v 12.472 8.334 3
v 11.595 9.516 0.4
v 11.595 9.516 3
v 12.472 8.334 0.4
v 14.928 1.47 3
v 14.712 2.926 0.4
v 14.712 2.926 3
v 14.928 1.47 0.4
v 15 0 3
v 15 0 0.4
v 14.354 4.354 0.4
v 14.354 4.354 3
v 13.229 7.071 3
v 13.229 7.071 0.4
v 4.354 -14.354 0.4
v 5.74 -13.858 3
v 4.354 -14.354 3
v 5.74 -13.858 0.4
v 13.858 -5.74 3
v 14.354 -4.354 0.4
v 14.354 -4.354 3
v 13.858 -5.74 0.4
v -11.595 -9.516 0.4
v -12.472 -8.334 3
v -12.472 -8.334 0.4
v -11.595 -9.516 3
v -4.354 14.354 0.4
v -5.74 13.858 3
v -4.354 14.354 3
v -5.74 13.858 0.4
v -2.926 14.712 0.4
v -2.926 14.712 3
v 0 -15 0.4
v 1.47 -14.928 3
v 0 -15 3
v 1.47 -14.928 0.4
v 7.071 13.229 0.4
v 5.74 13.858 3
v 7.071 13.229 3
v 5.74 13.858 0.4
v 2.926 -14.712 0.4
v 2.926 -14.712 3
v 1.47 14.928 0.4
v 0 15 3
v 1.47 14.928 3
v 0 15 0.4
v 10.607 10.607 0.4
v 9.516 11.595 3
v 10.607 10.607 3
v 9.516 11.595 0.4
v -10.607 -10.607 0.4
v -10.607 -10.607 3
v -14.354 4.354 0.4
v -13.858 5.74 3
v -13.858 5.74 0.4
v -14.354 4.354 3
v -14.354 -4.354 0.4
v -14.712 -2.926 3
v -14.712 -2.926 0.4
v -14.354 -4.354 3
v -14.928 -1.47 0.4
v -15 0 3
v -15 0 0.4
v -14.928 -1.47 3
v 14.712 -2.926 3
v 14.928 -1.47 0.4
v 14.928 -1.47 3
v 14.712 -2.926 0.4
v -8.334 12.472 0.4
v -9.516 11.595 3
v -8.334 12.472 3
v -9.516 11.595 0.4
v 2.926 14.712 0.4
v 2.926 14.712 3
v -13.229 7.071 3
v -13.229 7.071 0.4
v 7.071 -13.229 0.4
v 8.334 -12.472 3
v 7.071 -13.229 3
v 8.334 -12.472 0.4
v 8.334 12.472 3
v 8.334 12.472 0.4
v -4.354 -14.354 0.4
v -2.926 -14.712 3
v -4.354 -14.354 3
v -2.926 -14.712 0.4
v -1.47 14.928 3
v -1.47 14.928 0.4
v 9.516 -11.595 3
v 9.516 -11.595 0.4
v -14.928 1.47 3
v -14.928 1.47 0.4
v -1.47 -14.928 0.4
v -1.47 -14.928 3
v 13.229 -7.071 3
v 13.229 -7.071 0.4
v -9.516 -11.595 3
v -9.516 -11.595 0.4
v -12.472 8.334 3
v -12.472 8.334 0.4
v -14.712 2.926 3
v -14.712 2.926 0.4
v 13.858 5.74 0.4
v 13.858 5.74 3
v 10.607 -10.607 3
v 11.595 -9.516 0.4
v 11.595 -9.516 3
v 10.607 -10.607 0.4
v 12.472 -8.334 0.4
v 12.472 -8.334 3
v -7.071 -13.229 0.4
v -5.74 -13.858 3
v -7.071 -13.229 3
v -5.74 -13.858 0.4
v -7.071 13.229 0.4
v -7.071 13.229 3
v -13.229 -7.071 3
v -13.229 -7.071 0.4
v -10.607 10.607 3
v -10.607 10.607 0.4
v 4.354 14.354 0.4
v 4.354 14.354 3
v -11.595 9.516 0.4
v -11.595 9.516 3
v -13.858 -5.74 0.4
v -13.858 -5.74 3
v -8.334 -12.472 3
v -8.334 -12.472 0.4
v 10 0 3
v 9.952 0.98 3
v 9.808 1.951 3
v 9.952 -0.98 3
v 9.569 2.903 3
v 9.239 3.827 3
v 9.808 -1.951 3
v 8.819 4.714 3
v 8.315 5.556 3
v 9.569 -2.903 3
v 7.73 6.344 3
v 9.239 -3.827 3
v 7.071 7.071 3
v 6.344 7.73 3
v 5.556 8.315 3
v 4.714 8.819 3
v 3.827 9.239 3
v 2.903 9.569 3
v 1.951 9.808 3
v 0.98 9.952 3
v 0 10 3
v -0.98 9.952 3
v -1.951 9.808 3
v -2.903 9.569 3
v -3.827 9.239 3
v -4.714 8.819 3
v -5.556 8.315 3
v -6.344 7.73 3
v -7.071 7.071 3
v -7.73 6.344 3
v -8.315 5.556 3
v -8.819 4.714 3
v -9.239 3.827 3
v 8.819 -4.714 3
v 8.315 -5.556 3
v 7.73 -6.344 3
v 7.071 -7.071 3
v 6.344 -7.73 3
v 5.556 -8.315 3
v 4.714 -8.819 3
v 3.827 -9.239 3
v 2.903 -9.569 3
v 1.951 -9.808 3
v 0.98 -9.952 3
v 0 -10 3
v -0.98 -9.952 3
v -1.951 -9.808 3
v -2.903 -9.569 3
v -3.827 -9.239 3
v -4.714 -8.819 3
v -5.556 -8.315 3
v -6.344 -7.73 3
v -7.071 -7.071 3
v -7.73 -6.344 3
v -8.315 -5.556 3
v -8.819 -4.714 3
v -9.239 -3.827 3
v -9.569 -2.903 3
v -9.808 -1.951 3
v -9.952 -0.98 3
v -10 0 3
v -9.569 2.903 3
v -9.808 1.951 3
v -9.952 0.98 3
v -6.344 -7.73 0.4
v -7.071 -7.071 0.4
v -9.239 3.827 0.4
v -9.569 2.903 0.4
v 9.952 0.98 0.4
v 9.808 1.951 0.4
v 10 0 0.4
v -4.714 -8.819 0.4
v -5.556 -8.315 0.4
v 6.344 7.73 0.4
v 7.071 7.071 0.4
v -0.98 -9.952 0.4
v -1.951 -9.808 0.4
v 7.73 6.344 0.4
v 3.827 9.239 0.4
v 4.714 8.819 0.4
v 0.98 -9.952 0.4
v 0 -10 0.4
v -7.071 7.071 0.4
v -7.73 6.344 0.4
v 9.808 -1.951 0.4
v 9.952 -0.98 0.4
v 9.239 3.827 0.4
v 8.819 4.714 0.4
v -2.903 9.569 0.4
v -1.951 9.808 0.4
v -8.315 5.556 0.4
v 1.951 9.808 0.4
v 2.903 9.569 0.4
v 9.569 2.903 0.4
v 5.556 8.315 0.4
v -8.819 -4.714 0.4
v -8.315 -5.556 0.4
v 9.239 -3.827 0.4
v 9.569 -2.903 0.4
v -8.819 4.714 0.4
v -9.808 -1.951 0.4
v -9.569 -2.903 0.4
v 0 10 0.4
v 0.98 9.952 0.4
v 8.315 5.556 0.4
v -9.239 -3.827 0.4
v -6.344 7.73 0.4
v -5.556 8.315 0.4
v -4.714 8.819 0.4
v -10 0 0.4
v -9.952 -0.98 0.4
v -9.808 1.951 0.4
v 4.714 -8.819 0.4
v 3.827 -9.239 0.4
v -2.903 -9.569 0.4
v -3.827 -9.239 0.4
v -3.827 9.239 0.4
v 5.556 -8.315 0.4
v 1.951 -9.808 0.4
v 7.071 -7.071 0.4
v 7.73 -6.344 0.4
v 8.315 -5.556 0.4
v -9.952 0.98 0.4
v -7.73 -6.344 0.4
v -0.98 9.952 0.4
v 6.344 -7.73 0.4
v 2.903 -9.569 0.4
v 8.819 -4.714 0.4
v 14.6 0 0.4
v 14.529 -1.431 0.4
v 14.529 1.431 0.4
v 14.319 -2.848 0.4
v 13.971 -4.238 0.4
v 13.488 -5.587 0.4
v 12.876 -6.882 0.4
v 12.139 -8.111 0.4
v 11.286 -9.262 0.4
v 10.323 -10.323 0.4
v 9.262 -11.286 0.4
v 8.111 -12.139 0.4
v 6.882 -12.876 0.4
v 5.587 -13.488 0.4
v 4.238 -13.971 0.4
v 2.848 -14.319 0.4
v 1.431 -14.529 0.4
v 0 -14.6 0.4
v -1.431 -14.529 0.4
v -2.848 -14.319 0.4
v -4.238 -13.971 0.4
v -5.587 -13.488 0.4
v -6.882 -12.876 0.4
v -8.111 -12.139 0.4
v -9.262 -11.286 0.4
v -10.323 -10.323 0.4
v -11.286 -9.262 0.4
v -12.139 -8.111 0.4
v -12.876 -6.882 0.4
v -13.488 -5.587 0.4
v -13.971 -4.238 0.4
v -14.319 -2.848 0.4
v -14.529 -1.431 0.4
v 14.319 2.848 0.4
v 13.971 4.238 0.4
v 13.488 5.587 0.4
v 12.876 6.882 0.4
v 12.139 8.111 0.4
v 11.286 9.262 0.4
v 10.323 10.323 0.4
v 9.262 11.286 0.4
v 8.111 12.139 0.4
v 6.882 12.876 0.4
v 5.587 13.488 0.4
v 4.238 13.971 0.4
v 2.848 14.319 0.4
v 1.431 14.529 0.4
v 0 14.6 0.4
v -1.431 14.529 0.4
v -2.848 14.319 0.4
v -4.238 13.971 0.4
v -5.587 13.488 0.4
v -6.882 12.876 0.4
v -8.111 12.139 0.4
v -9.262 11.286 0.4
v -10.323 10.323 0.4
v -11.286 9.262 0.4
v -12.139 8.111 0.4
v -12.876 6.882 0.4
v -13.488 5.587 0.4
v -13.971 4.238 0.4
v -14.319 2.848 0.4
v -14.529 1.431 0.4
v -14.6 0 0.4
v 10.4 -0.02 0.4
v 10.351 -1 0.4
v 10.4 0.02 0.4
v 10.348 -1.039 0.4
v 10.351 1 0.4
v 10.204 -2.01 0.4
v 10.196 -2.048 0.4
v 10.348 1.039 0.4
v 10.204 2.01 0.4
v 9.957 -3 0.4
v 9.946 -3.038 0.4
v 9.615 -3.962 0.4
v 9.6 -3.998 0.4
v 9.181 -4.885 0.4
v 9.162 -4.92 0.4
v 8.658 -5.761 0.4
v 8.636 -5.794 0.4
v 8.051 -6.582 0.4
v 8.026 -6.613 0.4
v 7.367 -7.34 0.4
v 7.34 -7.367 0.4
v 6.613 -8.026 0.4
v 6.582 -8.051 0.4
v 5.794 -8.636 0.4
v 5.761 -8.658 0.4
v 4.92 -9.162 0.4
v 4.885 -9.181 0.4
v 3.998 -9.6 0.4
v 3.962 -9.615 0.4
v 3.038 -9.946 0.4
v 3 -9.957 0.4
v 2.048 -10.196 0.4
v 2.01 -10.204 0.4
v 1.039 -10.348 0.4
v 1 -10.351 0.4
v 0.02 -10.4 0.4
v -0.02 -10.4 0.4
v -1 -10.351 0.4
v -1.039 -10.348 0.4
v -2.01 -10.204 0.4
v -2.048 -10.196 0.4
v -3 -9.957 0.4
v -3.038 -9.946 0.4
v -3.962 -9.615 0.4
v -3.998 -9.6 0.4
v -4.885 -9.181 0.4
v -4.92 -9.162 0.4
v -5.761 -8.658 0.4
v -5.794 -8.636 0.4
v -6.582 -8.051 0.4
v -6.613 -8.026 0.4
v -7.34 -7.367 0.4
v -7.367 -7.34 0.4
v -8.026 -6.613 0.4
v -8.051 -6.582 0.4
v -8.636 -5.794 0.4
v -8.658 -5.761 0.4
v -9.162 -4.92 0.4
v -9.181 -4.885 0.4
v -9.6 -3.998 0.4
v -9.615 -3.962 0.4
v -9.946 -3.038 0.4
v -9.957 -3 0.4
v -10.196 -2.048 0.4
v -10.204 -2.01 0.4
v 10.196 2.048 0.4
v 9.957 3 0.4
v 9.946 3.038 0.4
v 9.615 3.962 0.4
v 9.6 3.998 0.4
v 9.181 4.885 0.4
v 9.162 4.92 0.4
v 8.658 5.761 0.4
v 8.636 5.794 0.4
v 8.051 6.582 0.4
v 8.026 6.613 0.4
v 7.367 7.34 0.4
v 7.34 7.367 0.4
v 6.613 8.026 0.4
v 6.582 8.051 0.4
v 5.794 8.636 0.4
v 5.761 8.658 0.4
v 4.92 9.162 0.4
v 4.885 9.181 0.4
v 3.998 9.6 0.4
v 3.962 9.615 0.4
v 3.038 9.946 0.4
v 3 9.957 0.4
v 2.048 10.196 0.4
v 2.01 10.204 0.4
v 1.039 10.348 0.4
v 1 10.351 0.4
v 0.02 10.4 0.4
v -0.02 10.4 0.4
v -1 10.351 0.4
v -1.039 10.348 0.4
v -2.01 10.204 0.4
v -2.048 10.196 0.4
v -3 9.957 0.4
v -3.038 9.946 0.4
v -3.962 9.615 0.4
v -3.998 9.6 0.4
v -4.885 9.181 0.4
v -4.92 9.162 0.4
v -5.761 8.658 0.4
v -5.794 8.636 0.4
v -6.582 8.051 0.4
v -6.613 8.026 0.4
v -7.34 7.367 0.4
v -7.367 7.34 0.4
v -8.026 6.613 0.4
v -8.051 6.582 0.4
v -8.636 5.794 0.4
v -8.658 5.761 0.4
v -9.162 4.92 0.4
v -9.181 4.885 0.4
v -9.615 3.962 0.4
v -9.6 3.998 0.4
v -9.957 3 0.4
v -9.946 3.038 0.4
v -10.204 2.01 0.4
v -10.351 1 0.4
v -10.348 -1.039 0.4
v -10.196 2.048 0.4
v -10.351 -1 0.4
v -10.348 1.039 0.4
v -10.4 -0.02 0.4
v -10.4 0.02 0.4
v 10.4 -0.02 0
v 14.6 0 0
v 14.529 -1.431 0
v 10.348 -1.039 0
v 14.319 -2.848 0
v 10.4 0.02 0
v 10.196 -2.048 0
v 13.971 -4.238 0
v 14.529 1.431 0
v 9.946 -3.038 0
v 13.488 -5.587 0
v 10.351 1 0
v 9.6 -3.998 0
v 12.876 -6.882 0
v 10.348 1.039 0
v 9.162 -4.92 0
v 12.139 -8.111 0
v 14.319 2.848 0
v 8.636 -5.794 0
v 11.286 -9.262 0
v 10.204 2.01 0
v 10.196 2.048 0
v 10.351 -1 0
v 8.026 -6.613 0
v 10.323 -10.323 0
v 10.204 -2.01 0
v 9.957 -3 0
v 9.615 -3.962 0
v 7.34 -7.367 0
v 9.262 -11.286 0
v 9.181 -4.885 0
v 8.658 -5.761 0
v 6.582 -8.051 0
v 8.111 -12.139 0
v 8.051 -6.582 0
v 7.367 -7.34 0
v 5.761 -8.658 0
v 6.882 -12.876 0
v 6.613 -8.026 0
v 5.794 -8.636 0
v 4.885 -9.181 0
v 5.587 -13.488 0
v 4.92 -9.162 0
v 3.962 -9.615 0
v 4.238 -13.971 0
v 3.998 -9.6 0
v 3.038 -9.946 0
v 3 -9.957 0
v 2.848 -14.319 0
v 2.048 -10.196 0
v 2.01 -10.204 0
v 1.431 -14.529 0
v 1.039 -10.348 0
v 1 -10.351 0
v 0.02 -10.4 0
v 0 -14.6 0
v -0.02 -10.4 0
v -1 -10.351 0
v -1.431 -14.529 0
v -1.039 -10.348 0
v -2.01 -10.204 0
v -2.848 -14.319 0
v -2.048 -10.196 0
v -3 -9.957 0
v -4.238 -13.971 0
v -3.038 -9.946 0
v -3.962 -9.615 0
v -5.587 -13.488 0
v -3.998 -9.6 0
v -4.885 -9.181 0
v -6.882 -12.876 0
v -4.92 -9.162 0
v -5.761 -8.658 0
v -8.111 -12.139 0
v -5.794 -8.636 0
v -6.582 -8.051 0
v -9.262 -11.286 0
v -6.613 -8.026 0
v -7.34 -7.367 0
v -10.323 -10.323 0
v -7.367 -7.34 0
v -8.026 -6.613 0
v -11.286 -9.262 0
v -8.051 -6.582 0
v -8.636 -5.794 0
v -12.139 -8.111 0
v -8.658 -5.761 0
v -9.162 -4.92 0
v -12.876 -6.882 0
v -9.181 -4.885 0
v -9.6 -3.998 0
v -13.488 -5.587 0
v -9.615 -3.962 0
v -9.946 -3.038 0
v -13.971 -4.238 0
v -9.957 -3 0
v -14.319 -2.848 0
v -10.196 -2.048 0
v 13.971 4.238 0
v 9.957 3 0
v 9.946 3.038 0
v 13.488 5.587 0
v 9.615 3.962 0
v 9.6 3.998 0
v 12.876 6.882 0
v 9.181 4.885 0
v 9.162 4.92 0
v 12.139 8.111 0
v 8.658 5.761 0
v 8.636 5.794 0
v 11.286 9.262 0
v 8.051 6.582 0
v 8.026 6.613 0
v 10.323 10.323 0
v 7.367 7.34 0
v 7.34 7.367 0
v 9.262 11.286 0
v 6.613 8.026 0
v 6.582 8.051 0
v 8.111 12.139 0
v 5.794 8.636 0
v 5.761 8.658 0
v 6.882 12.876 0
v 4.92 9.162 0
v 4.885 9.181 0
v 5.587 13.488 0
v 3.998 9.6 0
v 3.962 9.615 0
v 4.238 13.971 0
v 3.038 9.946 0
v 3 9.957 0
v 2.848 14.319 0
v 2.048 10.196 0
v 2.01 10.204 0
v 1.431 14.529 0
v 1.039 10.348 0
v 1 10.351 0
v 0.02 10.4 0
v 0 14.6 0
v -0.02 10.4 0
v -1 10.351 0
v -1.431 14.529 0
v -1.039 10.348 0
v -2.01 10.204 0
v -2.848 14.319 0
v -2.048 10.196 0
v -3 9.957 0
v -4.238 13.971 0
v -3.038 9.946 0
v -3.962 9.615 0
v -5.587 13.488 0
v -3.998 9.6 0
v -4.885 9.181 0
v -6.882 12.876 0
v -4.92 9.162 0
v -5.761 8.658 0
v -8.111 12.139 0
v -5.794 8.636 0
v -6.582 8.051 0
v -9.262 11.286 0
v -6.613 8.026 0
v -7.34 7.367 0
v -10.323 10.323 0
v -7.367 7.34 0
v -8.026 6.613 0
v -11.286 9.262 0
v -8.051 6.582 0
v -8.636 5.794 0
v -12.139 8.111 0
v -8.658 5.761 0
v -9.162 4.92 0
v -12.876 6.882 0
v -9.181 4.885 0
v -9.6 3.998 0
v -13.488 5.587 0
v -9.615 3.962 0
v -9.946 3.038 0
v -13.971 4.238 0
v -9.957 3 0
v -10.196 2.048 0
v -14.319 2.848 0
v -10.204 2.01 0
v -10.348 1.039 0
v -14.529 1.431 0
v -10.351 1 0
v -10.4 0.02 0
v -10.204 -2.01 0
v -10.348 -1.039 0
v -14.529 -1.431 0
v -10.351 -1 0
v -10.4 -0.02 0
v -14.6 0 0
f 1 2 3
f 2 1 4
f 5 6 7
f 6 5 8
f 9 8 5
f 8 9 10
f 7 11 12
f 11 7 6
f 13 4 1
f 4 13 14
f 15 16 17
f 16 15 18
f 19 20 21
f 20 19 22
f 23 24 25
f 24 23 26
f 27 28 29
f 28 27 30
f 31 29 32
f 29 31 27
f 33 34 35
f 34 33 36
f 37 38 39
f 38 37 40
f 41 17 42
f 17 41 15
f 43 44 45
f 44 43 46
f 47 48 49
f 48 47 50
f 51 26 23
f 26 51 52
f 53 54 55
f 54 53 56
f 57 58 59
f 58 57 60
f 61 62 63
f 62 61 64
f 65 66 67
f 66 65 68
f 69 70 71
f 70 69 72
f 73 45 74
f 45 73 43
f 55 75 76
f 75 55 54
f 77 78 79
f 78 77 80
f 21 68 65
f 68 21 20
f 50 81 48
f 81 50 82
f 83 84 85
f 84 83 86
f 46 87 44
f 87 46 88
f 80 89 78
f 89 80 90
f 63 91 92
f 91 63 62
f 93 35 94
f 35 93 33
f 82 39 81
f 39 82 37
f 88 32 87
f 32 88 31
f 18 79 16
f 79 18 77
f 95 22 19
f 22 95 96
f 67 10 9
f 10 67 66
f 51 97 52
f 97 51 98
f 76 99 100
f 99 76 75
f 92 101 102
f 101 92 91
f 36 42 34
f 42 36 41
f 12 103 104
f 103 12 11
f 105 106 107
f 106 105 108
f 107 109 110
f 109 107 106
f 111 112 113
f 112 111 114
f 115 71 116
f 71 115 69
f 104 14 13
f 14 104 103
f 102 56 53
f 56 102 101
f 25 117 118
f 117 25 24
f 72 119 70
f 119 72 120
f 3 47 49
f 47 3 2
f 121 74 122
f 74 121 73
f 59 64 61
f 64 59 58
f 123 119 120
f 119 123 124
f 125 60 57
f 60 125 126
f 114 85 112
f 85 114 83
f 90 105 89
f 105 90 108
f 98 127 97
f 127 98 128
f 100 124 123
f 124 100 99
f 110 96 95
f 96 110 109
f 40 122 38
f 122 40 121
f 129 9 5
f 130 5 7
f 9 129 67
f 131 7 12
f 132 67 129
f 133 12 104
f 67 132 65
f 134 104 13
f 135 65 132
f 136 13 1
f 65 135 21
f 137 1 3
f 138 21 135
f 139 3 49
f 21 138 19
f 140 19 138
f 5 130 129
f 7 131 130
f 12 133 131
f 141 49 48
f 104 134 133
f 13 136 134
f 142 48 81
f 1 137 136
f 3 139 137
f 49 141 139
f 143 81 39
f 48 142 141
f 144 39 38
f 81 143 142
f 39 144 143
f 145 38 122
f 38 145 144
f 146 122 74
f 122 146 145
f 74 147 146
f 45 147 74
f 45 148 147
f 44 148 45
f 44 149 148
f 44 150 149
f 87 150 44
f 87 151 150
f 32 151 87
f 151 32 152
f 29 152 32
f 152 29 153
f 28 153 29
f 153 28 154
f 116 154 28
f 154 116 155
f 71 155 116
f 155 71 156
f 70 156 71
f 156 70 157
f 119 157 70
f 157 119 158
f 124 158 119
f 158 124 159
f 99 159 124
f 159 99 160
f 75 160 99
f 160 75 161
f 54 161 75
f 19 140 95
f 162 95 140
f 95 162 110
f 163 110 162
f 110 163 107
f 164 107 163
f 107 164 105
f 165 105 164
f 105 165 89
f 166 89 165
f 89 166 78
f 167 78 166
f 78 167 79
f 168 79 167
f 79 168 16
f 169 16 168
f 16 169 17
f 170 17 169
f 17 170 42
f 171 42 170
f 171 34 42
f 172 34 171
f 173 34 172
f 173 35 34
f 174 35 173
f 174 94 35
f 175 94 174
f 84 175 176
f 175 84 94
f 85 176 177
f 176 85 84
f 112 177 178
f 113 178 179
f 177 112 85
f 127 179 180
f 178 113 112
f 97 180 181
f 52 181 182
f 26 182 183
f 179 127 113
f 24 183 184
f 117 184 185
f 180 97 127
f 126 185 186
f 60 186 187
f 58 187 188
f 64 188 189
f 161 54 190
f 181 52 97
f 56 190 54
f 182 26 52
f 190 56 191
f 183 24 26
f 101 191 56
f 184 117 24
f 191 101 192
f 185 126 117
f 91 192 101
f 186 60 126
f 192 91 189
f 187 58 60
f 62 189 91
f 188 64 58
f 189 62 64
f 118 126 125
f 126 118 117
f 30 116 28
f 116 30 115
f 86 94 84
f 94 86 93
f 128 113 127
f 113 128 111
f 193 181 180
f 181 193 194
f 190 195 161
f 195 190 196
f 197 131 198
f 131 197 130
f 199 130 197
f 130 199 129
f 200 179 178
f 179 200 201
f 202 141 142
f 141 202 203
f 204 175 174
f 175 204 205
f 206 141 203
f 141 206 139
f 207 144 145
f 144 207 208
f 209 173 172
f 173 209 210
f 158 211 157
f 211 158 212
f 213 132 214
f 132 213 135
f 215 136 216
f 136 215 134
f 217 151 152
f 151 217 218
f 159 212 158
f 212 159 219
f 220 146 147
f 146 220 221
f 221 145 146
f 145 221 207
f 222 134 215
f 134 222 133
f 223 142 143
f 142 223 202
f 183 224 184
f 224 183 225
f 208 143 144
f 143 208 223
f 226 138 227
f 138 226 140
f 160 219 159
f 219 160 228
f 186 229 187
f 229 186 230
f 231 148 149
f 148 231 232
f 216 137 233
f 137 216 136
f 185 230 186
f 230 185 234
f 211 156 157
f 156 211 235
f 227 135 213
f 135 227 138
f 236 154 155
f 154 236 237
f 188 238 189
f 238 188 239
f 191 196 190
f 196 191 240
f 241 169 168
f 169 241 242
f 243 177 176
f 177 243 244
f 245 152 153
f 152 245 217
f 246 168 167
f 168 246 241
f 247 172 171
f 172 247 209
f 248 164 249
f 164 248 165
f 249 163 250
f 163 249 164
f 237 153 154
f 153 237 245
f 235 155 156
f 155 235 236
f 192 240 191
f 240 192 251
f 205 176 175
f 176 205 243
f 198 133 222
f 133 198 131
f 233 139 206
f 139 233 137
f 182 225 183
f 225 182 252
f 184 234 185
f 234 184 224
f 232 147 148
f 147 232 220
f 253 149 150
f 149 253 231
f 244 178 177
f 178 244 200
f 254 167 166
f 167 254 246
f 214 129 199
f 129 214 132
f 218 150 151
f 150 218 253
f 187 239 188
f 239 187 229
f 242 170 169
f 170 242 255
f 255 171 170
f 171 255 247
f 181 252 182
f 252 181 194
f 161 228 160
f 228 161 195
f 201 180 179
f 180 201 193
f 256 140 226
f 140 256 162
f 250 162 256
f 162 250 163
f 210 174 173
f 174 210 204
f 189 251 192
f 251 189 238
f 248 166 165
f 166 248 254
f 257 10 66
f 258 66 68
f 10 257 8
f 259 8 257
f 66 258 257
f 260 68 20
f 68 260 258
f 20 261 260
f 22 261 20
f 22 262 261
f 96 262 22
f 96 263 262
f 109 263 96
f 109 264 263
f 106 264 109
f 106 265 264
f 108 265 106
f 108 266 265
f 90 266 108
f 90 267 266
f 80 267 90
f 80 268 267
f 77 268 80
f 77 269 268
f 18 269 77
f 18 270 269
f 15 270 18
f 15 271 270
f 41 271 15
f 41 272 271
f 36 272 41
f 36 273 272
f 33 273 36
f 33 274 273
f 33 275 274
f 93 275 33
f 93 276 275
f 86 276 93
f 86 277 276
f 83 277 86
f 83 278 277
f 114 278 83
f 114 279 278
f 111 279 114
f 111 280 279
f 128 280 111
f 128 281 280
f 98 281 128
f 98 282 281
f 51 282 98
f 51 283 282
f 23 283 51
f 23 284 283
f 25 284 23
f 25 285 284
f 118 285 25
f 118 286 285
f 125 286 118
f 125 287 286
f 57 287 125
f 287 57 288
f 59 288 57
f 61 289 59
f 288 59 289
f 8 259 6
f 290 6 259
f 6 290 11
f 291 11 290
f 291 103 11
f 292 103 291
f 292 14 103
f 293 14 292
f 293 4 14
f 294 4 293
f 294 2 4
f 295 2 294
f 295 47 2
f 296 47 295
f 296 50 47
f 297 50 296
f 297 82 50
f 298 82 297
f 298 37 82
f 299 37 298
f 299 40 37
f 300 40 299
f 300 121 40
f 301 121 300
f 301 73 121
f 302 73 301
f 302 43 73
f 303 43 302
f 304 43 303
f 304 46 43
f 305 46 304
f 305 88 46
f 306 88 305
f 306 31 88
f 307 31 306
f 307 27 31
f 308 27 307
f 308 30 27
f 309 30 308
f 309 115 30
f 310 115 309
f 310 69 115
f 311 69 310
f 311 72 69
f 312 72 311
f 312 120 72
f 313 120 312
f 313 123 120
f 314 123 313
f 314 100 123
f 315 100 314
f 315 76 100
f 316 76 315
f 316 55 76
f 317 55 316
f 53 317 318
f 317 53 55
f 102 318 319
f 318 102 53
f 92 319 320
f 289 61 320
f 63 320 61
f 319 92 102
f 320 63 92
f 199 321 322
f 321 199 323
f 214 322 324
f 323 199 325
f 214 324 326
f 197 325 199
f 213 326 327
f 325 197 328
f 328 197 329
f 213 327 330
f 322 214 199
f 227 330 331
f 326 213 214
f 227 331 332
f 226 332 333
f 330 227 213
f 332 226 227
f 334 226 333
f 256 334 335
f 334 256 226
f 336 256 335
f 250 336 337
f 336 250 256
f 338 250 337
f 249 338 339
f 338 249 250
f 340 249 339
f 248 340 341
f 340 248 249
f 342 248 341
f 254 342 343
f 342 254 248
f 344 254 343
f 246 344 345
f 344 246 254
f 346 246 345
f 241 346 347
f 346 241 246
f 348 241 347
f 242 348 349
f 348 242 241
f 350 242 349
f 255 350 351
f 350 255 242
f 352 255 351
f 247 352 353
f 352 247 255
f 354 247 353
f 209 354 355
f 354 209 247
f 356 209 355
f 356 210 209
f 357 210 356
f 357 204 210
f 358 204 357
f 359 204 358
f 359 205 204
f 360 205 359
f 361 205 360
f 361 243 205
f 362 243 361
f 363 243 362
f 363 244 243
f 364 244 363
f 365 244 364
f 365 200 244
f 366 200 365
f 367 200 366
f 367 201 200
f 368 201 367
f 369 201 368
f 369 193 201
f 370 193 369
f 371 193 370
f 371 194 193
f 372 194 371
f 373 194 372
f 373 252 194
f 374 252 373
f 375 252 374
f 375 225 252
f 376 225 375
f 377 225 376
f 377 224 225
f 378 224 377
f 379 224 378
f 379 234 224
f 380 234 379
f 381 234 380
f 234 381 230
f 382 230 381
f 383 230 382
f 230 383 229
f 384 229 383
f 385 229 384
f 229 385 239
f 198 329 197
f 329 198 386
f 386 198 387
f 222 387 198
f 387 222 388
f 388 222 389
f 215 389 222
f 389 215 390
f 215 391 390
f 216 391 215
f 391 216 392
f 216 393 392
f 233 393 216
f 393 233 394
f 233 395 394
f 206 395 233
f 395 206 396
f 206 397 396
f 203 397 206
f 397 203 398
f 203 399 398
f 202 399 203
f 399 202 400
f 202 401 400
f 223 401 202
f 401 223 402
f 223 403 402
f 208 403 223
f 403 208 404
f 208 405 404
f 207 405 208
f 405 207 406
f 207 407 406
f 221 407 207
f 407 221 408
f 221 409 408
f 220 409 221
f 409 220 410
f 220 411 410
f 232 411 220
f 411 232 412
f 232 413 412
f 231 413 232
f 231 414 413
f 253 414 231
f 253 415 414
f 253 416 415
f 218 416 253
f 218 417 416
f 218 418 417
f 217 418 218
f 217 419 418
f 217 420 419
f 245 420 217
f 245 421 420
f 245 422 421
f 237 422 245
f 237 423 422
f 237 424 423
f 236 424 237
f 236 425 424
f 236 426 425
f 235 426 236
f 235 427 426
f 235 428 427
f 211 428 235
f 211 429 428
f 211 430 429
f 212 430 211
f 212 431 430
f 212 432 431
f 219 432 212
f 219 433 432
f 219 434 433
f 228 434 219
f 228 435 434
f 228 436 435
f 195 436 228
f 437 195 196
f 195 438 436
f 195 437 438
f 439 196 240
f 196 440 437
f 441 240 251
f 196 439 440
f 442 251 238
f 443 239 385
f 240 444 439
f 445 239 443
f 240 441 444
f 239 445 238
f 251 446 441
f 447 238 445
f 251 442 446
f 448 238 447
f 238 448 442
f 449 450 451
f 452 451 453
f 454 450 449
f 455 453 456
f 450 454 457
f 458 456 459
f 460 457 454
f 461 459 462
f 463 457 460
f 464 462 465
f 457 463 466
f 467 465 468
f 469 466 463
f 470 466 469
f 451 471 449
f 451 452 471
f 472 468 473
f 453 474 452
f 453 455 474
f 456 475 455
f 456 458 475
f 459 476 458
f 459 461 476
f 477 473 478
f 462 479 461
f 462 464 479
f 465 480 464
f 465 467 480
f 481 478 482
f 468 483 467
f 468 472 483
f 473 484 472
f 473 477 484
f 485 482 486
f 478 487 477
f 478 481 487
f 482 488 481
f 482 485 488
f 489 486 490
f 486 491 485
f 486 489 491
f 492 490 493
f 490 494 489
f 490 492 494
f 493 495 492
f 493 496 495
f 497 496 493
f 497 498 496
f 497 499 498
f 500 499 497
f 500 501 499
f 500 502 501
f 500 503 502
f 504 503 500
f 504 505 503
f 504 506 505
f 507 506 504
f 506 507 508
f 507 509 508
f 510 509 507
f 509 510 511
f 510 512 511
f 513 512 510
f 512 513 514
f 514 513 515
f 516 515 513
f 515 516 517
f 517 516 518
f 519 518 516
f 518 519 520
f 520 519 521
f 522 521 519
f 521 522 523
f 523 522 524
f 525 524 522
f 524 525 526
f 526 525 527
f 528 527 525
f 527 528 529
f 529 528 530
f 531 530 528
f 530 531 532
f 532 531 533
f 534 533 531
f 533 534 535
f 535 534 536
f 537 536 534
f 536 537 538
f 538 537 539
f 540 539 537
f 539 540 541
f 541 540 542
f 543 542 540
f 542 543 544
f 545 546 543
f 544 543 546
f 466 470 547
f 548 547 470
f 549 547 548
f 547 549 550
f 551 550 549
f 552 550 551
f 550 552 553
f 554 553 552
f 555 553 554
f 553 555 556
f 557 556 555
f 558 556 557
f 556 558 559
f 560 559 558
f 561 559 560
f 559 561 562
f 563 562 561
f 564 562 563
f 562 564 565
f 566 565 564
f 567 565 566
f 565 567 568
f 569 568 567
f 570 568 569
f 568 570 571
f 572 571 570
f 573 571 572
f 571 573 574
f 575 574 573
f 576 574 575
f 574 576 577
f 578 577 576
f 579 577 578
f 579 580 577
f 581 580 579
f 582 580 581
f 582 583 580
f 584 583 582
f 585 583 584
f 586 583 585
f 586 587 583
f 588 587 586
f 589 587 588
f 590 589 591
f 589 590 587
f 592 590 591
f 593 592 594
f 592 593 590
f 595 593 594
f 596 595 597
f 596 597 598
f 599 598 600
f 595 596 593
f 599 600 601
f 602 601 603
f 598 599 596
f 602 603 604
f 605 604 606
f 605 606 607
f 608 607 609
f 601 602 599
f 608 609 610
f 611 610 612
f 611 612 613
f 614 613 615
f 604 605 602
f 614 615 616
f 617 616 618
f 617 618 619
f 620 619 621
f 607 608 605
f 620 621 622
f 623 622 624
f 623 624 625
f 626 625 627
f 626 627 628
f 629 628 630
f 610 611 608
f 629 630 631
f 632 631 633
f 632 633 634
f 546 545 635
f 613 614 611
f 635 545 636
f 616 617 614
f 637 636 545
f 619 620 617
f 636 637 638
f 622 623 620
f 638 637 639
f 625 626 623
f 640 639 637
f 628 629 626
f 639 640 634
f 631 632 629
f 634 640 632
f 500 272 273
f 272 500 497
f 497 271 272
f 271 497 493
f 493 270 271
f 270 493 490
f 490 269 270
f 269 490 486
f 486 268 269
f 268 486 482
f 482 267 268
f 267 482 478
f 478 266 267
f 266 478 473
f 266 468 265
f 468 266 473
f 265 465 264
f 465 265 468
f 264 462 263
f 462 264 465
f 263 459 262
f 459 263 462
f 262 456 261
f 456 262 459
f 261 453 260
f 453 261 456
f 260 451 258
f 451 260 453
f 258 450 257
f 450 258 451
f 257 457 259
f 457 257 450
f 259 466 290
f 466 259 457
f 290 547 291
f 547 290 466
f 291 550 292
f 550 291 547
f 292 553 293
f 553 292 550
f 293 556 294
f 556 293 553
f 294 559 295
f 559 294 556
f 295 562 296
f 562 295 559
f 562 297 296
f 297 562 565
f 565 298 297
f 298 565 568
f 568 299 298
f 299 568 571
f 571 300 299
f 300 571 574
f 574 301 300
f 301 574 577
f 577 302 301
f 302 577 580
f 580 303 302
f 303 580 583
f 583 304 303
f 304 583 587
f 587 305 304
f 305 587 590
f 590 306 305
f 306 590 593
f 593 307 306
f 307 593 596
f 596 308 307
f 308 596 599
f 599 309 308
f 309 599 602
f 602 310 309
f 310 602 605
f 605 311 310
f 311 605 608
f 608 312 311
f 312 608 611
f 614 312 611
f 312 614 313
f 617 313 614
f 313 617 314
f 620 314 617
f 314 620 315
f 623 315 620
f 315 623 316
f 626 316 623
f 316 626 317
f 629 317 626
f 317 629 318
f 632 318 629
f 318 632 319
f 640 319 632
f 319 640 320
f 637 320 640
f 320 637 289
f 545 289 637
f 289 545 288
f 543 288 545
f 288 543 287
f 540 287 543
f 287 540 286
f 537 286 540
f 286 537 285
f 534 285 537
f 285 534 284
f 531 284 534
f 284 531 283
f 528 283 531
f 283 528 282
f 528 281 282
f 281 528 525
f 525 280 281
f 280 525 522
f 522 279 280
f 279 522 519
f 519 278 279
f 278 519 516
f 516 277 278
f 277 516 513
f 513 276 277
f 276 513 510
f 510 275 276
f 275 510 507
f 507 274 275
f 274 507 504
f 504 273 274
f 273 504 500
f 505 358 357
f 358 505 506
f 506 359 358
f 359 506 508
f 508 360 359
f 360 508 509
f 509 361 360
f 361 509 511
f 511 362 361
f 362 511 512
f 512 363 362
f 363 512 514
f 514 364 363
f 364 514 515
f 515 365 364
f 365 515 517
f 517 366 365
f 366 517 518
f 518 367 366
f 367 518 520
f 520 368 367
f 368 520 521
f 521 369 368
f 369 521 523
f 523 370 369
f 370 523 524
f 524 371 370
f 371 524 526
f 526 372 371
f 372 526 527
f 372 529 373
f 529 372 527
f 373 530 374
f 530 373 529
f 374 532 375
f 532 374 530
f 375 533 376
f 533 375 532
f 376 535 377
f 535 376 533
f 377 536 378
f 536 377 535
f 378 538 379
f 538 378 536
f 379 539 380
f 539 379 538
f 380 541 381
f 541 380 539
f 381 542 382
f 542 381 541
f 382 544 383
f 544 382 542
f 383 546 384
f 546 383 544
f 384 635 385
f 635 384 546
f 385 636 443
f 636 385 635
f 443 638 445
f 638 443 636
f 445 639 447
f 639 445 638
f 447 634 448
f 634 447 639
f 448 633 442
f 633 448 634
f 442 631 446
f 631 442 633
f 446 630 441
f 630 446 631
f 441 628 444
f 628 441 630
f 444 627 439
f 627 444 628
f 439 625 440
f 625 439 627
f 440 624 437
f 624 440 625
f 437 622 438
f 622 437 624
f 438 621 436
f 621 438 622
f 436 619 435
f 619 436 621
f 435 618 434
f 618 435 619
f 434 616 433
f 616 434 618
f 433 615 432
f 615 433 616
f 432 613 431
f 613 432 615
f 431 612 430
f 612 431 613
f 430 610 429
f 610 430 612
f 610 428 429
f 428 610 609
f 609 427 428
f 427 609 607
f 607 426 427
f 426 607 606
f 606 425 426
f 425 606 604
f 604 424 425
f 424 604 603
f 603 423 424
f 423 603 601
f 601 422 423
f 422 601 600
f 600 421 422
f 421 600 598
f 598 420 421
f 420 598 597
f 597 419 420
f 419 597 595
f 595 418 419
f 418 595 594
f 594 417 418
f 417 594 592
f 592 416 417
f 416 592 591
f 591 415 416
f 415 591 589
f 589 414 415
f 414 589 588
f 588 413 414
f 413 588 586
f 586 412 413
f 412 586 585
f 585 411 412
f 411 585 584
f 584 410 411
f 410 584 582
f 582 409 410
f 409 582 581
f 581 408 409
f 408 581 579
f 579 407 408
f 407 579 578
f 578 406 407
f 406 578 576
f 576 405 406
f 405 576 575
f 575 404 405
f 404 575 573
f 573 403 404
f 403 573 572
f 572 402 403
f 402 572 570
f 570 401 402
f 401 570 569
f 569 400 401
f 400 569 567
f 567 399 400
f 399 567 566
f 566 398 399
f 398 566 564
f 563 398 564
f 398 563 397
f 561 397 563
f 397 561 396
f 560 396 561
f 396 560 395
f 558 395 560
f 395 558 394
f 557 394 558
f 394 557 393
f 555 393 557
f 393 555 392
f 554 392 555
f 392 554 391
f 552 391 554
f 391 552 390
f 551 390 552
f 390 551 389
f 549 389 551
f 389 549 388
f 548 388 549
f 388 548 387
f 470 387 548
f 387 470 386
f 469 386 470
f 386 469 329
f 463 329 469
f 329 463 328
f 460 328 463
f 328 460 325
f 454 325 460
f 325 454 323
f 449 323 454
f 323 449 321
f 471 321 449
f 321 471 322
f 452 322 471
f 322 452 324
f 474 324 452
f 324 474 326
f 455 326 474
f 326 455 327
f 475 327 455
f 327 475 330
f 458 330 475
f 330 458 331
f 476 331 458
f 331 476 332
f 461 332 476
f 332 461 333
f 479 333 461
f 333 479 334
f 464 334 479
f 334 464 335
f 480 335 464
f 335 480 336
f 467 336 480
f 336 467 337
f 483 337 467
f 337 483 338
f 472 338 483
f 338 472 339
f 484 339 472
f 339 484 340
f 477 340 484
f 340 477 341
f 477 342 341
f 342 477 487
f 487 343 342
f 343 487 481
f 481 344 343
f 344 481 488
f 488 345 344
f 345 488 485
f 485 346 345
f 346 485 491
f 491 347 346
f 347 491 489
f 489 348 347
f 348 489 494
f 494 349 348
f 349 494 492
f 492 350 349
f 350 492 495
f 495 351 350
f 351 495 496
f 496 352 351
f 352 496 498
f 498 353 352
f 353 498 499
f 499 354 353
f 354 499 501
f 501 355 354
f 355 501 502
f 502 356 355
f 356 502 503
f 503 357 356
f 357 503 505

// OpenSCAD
// An OpenScad script that demonstrates how to inset the bottom of
// arbitrary objects that are placed on the z=0 plane. This is useful
// to avoid the 'elephant feet' effect when the first layer(s) of 
// a 3D print are squashed out of the object's outline.

// Roundness
$fn=64;

// How much to inset the bottom.
inset_width = 0.4;

// How high to inset the bottom.  
inset_height = 0.4;

// The inner diameter of the test ring.
test_ring_id = 20;

// The width of the test ring.
test_ring_width = 5;

// The height of the test ring.
test_ring_height = 3;

// The inset function. The inset object(s) must be positioned
// exactly or slightly below the z=0 plane. As of March 2017,
// OpenScad doesn't allow to uery the position of the children.
//
// NOTE: a 'projection failed' error indicates that the inset
// object(s) do not intersect with the z=0 plane. It's safer to 
// position the children slightly below the z=0 plane (e.g. 
// by 0.01mm) to be on the safe side.
// 
// w = how much to inset.
// h = how high, from the z=0 plane, to inset.
// bounding_size = a large number, larger than max x and max y
//     of the inset object. Default should be good for more 3D
//     printing applications.
// eps = a small number to maintain manifold. Default should be 
//     good for most 3D printing applications.
module inset_bottom(w=0.4, h=0.2, bounding_size = 200, eps=0.01) {
  if (w == 0 || h < 0) {
    children();
  } else {
    // The top part of the children without the inset layer.
    difference() {
      children();
      // TODO: use actual extended children projection instead
      // of a clube with arbitrary large x,y values.
      translate([0, 0, -9*h]) 
          cube([bounding_size, bounding_size, 20*h], center=true);
    }
    // The inset layer.
    // We translate the children down by h/2 so we pick the middle
    // outline of the inset layer. This also takes care of slight
    // inaccuracies in the children elevations that may result
    // with non intersection with the z=0 plane.
    linear_extrude(height=h+eps) offset(r = -w) projection(cut=true)
      translate([0, 0, -h/2]) children();
  }
}

// A test object. We use a ring but the the inset_bottom() function
// should handle arbitrary objects as long as they are placed on the 
// z=0 plane or slightly below.
module test_ring() {
  difference() {
    cylinder(d=test_ring_id+2*test_ring_width, h=test_ring_height);
    translate([0, 0, -0.01]) cylinder(d=test_ring_id, h=test_ring_height+0.02);
  }  
}

// Demonstration how to call the inset_bottom() module  to inset
// the bottom of an object placed on the z=0 plane. 
// We speciy here explicit w and h to allow Thingiverse Customizer
// users play with the inset parameters.
inset_bottom(inset_width, inset_height) 
    test_ring();
